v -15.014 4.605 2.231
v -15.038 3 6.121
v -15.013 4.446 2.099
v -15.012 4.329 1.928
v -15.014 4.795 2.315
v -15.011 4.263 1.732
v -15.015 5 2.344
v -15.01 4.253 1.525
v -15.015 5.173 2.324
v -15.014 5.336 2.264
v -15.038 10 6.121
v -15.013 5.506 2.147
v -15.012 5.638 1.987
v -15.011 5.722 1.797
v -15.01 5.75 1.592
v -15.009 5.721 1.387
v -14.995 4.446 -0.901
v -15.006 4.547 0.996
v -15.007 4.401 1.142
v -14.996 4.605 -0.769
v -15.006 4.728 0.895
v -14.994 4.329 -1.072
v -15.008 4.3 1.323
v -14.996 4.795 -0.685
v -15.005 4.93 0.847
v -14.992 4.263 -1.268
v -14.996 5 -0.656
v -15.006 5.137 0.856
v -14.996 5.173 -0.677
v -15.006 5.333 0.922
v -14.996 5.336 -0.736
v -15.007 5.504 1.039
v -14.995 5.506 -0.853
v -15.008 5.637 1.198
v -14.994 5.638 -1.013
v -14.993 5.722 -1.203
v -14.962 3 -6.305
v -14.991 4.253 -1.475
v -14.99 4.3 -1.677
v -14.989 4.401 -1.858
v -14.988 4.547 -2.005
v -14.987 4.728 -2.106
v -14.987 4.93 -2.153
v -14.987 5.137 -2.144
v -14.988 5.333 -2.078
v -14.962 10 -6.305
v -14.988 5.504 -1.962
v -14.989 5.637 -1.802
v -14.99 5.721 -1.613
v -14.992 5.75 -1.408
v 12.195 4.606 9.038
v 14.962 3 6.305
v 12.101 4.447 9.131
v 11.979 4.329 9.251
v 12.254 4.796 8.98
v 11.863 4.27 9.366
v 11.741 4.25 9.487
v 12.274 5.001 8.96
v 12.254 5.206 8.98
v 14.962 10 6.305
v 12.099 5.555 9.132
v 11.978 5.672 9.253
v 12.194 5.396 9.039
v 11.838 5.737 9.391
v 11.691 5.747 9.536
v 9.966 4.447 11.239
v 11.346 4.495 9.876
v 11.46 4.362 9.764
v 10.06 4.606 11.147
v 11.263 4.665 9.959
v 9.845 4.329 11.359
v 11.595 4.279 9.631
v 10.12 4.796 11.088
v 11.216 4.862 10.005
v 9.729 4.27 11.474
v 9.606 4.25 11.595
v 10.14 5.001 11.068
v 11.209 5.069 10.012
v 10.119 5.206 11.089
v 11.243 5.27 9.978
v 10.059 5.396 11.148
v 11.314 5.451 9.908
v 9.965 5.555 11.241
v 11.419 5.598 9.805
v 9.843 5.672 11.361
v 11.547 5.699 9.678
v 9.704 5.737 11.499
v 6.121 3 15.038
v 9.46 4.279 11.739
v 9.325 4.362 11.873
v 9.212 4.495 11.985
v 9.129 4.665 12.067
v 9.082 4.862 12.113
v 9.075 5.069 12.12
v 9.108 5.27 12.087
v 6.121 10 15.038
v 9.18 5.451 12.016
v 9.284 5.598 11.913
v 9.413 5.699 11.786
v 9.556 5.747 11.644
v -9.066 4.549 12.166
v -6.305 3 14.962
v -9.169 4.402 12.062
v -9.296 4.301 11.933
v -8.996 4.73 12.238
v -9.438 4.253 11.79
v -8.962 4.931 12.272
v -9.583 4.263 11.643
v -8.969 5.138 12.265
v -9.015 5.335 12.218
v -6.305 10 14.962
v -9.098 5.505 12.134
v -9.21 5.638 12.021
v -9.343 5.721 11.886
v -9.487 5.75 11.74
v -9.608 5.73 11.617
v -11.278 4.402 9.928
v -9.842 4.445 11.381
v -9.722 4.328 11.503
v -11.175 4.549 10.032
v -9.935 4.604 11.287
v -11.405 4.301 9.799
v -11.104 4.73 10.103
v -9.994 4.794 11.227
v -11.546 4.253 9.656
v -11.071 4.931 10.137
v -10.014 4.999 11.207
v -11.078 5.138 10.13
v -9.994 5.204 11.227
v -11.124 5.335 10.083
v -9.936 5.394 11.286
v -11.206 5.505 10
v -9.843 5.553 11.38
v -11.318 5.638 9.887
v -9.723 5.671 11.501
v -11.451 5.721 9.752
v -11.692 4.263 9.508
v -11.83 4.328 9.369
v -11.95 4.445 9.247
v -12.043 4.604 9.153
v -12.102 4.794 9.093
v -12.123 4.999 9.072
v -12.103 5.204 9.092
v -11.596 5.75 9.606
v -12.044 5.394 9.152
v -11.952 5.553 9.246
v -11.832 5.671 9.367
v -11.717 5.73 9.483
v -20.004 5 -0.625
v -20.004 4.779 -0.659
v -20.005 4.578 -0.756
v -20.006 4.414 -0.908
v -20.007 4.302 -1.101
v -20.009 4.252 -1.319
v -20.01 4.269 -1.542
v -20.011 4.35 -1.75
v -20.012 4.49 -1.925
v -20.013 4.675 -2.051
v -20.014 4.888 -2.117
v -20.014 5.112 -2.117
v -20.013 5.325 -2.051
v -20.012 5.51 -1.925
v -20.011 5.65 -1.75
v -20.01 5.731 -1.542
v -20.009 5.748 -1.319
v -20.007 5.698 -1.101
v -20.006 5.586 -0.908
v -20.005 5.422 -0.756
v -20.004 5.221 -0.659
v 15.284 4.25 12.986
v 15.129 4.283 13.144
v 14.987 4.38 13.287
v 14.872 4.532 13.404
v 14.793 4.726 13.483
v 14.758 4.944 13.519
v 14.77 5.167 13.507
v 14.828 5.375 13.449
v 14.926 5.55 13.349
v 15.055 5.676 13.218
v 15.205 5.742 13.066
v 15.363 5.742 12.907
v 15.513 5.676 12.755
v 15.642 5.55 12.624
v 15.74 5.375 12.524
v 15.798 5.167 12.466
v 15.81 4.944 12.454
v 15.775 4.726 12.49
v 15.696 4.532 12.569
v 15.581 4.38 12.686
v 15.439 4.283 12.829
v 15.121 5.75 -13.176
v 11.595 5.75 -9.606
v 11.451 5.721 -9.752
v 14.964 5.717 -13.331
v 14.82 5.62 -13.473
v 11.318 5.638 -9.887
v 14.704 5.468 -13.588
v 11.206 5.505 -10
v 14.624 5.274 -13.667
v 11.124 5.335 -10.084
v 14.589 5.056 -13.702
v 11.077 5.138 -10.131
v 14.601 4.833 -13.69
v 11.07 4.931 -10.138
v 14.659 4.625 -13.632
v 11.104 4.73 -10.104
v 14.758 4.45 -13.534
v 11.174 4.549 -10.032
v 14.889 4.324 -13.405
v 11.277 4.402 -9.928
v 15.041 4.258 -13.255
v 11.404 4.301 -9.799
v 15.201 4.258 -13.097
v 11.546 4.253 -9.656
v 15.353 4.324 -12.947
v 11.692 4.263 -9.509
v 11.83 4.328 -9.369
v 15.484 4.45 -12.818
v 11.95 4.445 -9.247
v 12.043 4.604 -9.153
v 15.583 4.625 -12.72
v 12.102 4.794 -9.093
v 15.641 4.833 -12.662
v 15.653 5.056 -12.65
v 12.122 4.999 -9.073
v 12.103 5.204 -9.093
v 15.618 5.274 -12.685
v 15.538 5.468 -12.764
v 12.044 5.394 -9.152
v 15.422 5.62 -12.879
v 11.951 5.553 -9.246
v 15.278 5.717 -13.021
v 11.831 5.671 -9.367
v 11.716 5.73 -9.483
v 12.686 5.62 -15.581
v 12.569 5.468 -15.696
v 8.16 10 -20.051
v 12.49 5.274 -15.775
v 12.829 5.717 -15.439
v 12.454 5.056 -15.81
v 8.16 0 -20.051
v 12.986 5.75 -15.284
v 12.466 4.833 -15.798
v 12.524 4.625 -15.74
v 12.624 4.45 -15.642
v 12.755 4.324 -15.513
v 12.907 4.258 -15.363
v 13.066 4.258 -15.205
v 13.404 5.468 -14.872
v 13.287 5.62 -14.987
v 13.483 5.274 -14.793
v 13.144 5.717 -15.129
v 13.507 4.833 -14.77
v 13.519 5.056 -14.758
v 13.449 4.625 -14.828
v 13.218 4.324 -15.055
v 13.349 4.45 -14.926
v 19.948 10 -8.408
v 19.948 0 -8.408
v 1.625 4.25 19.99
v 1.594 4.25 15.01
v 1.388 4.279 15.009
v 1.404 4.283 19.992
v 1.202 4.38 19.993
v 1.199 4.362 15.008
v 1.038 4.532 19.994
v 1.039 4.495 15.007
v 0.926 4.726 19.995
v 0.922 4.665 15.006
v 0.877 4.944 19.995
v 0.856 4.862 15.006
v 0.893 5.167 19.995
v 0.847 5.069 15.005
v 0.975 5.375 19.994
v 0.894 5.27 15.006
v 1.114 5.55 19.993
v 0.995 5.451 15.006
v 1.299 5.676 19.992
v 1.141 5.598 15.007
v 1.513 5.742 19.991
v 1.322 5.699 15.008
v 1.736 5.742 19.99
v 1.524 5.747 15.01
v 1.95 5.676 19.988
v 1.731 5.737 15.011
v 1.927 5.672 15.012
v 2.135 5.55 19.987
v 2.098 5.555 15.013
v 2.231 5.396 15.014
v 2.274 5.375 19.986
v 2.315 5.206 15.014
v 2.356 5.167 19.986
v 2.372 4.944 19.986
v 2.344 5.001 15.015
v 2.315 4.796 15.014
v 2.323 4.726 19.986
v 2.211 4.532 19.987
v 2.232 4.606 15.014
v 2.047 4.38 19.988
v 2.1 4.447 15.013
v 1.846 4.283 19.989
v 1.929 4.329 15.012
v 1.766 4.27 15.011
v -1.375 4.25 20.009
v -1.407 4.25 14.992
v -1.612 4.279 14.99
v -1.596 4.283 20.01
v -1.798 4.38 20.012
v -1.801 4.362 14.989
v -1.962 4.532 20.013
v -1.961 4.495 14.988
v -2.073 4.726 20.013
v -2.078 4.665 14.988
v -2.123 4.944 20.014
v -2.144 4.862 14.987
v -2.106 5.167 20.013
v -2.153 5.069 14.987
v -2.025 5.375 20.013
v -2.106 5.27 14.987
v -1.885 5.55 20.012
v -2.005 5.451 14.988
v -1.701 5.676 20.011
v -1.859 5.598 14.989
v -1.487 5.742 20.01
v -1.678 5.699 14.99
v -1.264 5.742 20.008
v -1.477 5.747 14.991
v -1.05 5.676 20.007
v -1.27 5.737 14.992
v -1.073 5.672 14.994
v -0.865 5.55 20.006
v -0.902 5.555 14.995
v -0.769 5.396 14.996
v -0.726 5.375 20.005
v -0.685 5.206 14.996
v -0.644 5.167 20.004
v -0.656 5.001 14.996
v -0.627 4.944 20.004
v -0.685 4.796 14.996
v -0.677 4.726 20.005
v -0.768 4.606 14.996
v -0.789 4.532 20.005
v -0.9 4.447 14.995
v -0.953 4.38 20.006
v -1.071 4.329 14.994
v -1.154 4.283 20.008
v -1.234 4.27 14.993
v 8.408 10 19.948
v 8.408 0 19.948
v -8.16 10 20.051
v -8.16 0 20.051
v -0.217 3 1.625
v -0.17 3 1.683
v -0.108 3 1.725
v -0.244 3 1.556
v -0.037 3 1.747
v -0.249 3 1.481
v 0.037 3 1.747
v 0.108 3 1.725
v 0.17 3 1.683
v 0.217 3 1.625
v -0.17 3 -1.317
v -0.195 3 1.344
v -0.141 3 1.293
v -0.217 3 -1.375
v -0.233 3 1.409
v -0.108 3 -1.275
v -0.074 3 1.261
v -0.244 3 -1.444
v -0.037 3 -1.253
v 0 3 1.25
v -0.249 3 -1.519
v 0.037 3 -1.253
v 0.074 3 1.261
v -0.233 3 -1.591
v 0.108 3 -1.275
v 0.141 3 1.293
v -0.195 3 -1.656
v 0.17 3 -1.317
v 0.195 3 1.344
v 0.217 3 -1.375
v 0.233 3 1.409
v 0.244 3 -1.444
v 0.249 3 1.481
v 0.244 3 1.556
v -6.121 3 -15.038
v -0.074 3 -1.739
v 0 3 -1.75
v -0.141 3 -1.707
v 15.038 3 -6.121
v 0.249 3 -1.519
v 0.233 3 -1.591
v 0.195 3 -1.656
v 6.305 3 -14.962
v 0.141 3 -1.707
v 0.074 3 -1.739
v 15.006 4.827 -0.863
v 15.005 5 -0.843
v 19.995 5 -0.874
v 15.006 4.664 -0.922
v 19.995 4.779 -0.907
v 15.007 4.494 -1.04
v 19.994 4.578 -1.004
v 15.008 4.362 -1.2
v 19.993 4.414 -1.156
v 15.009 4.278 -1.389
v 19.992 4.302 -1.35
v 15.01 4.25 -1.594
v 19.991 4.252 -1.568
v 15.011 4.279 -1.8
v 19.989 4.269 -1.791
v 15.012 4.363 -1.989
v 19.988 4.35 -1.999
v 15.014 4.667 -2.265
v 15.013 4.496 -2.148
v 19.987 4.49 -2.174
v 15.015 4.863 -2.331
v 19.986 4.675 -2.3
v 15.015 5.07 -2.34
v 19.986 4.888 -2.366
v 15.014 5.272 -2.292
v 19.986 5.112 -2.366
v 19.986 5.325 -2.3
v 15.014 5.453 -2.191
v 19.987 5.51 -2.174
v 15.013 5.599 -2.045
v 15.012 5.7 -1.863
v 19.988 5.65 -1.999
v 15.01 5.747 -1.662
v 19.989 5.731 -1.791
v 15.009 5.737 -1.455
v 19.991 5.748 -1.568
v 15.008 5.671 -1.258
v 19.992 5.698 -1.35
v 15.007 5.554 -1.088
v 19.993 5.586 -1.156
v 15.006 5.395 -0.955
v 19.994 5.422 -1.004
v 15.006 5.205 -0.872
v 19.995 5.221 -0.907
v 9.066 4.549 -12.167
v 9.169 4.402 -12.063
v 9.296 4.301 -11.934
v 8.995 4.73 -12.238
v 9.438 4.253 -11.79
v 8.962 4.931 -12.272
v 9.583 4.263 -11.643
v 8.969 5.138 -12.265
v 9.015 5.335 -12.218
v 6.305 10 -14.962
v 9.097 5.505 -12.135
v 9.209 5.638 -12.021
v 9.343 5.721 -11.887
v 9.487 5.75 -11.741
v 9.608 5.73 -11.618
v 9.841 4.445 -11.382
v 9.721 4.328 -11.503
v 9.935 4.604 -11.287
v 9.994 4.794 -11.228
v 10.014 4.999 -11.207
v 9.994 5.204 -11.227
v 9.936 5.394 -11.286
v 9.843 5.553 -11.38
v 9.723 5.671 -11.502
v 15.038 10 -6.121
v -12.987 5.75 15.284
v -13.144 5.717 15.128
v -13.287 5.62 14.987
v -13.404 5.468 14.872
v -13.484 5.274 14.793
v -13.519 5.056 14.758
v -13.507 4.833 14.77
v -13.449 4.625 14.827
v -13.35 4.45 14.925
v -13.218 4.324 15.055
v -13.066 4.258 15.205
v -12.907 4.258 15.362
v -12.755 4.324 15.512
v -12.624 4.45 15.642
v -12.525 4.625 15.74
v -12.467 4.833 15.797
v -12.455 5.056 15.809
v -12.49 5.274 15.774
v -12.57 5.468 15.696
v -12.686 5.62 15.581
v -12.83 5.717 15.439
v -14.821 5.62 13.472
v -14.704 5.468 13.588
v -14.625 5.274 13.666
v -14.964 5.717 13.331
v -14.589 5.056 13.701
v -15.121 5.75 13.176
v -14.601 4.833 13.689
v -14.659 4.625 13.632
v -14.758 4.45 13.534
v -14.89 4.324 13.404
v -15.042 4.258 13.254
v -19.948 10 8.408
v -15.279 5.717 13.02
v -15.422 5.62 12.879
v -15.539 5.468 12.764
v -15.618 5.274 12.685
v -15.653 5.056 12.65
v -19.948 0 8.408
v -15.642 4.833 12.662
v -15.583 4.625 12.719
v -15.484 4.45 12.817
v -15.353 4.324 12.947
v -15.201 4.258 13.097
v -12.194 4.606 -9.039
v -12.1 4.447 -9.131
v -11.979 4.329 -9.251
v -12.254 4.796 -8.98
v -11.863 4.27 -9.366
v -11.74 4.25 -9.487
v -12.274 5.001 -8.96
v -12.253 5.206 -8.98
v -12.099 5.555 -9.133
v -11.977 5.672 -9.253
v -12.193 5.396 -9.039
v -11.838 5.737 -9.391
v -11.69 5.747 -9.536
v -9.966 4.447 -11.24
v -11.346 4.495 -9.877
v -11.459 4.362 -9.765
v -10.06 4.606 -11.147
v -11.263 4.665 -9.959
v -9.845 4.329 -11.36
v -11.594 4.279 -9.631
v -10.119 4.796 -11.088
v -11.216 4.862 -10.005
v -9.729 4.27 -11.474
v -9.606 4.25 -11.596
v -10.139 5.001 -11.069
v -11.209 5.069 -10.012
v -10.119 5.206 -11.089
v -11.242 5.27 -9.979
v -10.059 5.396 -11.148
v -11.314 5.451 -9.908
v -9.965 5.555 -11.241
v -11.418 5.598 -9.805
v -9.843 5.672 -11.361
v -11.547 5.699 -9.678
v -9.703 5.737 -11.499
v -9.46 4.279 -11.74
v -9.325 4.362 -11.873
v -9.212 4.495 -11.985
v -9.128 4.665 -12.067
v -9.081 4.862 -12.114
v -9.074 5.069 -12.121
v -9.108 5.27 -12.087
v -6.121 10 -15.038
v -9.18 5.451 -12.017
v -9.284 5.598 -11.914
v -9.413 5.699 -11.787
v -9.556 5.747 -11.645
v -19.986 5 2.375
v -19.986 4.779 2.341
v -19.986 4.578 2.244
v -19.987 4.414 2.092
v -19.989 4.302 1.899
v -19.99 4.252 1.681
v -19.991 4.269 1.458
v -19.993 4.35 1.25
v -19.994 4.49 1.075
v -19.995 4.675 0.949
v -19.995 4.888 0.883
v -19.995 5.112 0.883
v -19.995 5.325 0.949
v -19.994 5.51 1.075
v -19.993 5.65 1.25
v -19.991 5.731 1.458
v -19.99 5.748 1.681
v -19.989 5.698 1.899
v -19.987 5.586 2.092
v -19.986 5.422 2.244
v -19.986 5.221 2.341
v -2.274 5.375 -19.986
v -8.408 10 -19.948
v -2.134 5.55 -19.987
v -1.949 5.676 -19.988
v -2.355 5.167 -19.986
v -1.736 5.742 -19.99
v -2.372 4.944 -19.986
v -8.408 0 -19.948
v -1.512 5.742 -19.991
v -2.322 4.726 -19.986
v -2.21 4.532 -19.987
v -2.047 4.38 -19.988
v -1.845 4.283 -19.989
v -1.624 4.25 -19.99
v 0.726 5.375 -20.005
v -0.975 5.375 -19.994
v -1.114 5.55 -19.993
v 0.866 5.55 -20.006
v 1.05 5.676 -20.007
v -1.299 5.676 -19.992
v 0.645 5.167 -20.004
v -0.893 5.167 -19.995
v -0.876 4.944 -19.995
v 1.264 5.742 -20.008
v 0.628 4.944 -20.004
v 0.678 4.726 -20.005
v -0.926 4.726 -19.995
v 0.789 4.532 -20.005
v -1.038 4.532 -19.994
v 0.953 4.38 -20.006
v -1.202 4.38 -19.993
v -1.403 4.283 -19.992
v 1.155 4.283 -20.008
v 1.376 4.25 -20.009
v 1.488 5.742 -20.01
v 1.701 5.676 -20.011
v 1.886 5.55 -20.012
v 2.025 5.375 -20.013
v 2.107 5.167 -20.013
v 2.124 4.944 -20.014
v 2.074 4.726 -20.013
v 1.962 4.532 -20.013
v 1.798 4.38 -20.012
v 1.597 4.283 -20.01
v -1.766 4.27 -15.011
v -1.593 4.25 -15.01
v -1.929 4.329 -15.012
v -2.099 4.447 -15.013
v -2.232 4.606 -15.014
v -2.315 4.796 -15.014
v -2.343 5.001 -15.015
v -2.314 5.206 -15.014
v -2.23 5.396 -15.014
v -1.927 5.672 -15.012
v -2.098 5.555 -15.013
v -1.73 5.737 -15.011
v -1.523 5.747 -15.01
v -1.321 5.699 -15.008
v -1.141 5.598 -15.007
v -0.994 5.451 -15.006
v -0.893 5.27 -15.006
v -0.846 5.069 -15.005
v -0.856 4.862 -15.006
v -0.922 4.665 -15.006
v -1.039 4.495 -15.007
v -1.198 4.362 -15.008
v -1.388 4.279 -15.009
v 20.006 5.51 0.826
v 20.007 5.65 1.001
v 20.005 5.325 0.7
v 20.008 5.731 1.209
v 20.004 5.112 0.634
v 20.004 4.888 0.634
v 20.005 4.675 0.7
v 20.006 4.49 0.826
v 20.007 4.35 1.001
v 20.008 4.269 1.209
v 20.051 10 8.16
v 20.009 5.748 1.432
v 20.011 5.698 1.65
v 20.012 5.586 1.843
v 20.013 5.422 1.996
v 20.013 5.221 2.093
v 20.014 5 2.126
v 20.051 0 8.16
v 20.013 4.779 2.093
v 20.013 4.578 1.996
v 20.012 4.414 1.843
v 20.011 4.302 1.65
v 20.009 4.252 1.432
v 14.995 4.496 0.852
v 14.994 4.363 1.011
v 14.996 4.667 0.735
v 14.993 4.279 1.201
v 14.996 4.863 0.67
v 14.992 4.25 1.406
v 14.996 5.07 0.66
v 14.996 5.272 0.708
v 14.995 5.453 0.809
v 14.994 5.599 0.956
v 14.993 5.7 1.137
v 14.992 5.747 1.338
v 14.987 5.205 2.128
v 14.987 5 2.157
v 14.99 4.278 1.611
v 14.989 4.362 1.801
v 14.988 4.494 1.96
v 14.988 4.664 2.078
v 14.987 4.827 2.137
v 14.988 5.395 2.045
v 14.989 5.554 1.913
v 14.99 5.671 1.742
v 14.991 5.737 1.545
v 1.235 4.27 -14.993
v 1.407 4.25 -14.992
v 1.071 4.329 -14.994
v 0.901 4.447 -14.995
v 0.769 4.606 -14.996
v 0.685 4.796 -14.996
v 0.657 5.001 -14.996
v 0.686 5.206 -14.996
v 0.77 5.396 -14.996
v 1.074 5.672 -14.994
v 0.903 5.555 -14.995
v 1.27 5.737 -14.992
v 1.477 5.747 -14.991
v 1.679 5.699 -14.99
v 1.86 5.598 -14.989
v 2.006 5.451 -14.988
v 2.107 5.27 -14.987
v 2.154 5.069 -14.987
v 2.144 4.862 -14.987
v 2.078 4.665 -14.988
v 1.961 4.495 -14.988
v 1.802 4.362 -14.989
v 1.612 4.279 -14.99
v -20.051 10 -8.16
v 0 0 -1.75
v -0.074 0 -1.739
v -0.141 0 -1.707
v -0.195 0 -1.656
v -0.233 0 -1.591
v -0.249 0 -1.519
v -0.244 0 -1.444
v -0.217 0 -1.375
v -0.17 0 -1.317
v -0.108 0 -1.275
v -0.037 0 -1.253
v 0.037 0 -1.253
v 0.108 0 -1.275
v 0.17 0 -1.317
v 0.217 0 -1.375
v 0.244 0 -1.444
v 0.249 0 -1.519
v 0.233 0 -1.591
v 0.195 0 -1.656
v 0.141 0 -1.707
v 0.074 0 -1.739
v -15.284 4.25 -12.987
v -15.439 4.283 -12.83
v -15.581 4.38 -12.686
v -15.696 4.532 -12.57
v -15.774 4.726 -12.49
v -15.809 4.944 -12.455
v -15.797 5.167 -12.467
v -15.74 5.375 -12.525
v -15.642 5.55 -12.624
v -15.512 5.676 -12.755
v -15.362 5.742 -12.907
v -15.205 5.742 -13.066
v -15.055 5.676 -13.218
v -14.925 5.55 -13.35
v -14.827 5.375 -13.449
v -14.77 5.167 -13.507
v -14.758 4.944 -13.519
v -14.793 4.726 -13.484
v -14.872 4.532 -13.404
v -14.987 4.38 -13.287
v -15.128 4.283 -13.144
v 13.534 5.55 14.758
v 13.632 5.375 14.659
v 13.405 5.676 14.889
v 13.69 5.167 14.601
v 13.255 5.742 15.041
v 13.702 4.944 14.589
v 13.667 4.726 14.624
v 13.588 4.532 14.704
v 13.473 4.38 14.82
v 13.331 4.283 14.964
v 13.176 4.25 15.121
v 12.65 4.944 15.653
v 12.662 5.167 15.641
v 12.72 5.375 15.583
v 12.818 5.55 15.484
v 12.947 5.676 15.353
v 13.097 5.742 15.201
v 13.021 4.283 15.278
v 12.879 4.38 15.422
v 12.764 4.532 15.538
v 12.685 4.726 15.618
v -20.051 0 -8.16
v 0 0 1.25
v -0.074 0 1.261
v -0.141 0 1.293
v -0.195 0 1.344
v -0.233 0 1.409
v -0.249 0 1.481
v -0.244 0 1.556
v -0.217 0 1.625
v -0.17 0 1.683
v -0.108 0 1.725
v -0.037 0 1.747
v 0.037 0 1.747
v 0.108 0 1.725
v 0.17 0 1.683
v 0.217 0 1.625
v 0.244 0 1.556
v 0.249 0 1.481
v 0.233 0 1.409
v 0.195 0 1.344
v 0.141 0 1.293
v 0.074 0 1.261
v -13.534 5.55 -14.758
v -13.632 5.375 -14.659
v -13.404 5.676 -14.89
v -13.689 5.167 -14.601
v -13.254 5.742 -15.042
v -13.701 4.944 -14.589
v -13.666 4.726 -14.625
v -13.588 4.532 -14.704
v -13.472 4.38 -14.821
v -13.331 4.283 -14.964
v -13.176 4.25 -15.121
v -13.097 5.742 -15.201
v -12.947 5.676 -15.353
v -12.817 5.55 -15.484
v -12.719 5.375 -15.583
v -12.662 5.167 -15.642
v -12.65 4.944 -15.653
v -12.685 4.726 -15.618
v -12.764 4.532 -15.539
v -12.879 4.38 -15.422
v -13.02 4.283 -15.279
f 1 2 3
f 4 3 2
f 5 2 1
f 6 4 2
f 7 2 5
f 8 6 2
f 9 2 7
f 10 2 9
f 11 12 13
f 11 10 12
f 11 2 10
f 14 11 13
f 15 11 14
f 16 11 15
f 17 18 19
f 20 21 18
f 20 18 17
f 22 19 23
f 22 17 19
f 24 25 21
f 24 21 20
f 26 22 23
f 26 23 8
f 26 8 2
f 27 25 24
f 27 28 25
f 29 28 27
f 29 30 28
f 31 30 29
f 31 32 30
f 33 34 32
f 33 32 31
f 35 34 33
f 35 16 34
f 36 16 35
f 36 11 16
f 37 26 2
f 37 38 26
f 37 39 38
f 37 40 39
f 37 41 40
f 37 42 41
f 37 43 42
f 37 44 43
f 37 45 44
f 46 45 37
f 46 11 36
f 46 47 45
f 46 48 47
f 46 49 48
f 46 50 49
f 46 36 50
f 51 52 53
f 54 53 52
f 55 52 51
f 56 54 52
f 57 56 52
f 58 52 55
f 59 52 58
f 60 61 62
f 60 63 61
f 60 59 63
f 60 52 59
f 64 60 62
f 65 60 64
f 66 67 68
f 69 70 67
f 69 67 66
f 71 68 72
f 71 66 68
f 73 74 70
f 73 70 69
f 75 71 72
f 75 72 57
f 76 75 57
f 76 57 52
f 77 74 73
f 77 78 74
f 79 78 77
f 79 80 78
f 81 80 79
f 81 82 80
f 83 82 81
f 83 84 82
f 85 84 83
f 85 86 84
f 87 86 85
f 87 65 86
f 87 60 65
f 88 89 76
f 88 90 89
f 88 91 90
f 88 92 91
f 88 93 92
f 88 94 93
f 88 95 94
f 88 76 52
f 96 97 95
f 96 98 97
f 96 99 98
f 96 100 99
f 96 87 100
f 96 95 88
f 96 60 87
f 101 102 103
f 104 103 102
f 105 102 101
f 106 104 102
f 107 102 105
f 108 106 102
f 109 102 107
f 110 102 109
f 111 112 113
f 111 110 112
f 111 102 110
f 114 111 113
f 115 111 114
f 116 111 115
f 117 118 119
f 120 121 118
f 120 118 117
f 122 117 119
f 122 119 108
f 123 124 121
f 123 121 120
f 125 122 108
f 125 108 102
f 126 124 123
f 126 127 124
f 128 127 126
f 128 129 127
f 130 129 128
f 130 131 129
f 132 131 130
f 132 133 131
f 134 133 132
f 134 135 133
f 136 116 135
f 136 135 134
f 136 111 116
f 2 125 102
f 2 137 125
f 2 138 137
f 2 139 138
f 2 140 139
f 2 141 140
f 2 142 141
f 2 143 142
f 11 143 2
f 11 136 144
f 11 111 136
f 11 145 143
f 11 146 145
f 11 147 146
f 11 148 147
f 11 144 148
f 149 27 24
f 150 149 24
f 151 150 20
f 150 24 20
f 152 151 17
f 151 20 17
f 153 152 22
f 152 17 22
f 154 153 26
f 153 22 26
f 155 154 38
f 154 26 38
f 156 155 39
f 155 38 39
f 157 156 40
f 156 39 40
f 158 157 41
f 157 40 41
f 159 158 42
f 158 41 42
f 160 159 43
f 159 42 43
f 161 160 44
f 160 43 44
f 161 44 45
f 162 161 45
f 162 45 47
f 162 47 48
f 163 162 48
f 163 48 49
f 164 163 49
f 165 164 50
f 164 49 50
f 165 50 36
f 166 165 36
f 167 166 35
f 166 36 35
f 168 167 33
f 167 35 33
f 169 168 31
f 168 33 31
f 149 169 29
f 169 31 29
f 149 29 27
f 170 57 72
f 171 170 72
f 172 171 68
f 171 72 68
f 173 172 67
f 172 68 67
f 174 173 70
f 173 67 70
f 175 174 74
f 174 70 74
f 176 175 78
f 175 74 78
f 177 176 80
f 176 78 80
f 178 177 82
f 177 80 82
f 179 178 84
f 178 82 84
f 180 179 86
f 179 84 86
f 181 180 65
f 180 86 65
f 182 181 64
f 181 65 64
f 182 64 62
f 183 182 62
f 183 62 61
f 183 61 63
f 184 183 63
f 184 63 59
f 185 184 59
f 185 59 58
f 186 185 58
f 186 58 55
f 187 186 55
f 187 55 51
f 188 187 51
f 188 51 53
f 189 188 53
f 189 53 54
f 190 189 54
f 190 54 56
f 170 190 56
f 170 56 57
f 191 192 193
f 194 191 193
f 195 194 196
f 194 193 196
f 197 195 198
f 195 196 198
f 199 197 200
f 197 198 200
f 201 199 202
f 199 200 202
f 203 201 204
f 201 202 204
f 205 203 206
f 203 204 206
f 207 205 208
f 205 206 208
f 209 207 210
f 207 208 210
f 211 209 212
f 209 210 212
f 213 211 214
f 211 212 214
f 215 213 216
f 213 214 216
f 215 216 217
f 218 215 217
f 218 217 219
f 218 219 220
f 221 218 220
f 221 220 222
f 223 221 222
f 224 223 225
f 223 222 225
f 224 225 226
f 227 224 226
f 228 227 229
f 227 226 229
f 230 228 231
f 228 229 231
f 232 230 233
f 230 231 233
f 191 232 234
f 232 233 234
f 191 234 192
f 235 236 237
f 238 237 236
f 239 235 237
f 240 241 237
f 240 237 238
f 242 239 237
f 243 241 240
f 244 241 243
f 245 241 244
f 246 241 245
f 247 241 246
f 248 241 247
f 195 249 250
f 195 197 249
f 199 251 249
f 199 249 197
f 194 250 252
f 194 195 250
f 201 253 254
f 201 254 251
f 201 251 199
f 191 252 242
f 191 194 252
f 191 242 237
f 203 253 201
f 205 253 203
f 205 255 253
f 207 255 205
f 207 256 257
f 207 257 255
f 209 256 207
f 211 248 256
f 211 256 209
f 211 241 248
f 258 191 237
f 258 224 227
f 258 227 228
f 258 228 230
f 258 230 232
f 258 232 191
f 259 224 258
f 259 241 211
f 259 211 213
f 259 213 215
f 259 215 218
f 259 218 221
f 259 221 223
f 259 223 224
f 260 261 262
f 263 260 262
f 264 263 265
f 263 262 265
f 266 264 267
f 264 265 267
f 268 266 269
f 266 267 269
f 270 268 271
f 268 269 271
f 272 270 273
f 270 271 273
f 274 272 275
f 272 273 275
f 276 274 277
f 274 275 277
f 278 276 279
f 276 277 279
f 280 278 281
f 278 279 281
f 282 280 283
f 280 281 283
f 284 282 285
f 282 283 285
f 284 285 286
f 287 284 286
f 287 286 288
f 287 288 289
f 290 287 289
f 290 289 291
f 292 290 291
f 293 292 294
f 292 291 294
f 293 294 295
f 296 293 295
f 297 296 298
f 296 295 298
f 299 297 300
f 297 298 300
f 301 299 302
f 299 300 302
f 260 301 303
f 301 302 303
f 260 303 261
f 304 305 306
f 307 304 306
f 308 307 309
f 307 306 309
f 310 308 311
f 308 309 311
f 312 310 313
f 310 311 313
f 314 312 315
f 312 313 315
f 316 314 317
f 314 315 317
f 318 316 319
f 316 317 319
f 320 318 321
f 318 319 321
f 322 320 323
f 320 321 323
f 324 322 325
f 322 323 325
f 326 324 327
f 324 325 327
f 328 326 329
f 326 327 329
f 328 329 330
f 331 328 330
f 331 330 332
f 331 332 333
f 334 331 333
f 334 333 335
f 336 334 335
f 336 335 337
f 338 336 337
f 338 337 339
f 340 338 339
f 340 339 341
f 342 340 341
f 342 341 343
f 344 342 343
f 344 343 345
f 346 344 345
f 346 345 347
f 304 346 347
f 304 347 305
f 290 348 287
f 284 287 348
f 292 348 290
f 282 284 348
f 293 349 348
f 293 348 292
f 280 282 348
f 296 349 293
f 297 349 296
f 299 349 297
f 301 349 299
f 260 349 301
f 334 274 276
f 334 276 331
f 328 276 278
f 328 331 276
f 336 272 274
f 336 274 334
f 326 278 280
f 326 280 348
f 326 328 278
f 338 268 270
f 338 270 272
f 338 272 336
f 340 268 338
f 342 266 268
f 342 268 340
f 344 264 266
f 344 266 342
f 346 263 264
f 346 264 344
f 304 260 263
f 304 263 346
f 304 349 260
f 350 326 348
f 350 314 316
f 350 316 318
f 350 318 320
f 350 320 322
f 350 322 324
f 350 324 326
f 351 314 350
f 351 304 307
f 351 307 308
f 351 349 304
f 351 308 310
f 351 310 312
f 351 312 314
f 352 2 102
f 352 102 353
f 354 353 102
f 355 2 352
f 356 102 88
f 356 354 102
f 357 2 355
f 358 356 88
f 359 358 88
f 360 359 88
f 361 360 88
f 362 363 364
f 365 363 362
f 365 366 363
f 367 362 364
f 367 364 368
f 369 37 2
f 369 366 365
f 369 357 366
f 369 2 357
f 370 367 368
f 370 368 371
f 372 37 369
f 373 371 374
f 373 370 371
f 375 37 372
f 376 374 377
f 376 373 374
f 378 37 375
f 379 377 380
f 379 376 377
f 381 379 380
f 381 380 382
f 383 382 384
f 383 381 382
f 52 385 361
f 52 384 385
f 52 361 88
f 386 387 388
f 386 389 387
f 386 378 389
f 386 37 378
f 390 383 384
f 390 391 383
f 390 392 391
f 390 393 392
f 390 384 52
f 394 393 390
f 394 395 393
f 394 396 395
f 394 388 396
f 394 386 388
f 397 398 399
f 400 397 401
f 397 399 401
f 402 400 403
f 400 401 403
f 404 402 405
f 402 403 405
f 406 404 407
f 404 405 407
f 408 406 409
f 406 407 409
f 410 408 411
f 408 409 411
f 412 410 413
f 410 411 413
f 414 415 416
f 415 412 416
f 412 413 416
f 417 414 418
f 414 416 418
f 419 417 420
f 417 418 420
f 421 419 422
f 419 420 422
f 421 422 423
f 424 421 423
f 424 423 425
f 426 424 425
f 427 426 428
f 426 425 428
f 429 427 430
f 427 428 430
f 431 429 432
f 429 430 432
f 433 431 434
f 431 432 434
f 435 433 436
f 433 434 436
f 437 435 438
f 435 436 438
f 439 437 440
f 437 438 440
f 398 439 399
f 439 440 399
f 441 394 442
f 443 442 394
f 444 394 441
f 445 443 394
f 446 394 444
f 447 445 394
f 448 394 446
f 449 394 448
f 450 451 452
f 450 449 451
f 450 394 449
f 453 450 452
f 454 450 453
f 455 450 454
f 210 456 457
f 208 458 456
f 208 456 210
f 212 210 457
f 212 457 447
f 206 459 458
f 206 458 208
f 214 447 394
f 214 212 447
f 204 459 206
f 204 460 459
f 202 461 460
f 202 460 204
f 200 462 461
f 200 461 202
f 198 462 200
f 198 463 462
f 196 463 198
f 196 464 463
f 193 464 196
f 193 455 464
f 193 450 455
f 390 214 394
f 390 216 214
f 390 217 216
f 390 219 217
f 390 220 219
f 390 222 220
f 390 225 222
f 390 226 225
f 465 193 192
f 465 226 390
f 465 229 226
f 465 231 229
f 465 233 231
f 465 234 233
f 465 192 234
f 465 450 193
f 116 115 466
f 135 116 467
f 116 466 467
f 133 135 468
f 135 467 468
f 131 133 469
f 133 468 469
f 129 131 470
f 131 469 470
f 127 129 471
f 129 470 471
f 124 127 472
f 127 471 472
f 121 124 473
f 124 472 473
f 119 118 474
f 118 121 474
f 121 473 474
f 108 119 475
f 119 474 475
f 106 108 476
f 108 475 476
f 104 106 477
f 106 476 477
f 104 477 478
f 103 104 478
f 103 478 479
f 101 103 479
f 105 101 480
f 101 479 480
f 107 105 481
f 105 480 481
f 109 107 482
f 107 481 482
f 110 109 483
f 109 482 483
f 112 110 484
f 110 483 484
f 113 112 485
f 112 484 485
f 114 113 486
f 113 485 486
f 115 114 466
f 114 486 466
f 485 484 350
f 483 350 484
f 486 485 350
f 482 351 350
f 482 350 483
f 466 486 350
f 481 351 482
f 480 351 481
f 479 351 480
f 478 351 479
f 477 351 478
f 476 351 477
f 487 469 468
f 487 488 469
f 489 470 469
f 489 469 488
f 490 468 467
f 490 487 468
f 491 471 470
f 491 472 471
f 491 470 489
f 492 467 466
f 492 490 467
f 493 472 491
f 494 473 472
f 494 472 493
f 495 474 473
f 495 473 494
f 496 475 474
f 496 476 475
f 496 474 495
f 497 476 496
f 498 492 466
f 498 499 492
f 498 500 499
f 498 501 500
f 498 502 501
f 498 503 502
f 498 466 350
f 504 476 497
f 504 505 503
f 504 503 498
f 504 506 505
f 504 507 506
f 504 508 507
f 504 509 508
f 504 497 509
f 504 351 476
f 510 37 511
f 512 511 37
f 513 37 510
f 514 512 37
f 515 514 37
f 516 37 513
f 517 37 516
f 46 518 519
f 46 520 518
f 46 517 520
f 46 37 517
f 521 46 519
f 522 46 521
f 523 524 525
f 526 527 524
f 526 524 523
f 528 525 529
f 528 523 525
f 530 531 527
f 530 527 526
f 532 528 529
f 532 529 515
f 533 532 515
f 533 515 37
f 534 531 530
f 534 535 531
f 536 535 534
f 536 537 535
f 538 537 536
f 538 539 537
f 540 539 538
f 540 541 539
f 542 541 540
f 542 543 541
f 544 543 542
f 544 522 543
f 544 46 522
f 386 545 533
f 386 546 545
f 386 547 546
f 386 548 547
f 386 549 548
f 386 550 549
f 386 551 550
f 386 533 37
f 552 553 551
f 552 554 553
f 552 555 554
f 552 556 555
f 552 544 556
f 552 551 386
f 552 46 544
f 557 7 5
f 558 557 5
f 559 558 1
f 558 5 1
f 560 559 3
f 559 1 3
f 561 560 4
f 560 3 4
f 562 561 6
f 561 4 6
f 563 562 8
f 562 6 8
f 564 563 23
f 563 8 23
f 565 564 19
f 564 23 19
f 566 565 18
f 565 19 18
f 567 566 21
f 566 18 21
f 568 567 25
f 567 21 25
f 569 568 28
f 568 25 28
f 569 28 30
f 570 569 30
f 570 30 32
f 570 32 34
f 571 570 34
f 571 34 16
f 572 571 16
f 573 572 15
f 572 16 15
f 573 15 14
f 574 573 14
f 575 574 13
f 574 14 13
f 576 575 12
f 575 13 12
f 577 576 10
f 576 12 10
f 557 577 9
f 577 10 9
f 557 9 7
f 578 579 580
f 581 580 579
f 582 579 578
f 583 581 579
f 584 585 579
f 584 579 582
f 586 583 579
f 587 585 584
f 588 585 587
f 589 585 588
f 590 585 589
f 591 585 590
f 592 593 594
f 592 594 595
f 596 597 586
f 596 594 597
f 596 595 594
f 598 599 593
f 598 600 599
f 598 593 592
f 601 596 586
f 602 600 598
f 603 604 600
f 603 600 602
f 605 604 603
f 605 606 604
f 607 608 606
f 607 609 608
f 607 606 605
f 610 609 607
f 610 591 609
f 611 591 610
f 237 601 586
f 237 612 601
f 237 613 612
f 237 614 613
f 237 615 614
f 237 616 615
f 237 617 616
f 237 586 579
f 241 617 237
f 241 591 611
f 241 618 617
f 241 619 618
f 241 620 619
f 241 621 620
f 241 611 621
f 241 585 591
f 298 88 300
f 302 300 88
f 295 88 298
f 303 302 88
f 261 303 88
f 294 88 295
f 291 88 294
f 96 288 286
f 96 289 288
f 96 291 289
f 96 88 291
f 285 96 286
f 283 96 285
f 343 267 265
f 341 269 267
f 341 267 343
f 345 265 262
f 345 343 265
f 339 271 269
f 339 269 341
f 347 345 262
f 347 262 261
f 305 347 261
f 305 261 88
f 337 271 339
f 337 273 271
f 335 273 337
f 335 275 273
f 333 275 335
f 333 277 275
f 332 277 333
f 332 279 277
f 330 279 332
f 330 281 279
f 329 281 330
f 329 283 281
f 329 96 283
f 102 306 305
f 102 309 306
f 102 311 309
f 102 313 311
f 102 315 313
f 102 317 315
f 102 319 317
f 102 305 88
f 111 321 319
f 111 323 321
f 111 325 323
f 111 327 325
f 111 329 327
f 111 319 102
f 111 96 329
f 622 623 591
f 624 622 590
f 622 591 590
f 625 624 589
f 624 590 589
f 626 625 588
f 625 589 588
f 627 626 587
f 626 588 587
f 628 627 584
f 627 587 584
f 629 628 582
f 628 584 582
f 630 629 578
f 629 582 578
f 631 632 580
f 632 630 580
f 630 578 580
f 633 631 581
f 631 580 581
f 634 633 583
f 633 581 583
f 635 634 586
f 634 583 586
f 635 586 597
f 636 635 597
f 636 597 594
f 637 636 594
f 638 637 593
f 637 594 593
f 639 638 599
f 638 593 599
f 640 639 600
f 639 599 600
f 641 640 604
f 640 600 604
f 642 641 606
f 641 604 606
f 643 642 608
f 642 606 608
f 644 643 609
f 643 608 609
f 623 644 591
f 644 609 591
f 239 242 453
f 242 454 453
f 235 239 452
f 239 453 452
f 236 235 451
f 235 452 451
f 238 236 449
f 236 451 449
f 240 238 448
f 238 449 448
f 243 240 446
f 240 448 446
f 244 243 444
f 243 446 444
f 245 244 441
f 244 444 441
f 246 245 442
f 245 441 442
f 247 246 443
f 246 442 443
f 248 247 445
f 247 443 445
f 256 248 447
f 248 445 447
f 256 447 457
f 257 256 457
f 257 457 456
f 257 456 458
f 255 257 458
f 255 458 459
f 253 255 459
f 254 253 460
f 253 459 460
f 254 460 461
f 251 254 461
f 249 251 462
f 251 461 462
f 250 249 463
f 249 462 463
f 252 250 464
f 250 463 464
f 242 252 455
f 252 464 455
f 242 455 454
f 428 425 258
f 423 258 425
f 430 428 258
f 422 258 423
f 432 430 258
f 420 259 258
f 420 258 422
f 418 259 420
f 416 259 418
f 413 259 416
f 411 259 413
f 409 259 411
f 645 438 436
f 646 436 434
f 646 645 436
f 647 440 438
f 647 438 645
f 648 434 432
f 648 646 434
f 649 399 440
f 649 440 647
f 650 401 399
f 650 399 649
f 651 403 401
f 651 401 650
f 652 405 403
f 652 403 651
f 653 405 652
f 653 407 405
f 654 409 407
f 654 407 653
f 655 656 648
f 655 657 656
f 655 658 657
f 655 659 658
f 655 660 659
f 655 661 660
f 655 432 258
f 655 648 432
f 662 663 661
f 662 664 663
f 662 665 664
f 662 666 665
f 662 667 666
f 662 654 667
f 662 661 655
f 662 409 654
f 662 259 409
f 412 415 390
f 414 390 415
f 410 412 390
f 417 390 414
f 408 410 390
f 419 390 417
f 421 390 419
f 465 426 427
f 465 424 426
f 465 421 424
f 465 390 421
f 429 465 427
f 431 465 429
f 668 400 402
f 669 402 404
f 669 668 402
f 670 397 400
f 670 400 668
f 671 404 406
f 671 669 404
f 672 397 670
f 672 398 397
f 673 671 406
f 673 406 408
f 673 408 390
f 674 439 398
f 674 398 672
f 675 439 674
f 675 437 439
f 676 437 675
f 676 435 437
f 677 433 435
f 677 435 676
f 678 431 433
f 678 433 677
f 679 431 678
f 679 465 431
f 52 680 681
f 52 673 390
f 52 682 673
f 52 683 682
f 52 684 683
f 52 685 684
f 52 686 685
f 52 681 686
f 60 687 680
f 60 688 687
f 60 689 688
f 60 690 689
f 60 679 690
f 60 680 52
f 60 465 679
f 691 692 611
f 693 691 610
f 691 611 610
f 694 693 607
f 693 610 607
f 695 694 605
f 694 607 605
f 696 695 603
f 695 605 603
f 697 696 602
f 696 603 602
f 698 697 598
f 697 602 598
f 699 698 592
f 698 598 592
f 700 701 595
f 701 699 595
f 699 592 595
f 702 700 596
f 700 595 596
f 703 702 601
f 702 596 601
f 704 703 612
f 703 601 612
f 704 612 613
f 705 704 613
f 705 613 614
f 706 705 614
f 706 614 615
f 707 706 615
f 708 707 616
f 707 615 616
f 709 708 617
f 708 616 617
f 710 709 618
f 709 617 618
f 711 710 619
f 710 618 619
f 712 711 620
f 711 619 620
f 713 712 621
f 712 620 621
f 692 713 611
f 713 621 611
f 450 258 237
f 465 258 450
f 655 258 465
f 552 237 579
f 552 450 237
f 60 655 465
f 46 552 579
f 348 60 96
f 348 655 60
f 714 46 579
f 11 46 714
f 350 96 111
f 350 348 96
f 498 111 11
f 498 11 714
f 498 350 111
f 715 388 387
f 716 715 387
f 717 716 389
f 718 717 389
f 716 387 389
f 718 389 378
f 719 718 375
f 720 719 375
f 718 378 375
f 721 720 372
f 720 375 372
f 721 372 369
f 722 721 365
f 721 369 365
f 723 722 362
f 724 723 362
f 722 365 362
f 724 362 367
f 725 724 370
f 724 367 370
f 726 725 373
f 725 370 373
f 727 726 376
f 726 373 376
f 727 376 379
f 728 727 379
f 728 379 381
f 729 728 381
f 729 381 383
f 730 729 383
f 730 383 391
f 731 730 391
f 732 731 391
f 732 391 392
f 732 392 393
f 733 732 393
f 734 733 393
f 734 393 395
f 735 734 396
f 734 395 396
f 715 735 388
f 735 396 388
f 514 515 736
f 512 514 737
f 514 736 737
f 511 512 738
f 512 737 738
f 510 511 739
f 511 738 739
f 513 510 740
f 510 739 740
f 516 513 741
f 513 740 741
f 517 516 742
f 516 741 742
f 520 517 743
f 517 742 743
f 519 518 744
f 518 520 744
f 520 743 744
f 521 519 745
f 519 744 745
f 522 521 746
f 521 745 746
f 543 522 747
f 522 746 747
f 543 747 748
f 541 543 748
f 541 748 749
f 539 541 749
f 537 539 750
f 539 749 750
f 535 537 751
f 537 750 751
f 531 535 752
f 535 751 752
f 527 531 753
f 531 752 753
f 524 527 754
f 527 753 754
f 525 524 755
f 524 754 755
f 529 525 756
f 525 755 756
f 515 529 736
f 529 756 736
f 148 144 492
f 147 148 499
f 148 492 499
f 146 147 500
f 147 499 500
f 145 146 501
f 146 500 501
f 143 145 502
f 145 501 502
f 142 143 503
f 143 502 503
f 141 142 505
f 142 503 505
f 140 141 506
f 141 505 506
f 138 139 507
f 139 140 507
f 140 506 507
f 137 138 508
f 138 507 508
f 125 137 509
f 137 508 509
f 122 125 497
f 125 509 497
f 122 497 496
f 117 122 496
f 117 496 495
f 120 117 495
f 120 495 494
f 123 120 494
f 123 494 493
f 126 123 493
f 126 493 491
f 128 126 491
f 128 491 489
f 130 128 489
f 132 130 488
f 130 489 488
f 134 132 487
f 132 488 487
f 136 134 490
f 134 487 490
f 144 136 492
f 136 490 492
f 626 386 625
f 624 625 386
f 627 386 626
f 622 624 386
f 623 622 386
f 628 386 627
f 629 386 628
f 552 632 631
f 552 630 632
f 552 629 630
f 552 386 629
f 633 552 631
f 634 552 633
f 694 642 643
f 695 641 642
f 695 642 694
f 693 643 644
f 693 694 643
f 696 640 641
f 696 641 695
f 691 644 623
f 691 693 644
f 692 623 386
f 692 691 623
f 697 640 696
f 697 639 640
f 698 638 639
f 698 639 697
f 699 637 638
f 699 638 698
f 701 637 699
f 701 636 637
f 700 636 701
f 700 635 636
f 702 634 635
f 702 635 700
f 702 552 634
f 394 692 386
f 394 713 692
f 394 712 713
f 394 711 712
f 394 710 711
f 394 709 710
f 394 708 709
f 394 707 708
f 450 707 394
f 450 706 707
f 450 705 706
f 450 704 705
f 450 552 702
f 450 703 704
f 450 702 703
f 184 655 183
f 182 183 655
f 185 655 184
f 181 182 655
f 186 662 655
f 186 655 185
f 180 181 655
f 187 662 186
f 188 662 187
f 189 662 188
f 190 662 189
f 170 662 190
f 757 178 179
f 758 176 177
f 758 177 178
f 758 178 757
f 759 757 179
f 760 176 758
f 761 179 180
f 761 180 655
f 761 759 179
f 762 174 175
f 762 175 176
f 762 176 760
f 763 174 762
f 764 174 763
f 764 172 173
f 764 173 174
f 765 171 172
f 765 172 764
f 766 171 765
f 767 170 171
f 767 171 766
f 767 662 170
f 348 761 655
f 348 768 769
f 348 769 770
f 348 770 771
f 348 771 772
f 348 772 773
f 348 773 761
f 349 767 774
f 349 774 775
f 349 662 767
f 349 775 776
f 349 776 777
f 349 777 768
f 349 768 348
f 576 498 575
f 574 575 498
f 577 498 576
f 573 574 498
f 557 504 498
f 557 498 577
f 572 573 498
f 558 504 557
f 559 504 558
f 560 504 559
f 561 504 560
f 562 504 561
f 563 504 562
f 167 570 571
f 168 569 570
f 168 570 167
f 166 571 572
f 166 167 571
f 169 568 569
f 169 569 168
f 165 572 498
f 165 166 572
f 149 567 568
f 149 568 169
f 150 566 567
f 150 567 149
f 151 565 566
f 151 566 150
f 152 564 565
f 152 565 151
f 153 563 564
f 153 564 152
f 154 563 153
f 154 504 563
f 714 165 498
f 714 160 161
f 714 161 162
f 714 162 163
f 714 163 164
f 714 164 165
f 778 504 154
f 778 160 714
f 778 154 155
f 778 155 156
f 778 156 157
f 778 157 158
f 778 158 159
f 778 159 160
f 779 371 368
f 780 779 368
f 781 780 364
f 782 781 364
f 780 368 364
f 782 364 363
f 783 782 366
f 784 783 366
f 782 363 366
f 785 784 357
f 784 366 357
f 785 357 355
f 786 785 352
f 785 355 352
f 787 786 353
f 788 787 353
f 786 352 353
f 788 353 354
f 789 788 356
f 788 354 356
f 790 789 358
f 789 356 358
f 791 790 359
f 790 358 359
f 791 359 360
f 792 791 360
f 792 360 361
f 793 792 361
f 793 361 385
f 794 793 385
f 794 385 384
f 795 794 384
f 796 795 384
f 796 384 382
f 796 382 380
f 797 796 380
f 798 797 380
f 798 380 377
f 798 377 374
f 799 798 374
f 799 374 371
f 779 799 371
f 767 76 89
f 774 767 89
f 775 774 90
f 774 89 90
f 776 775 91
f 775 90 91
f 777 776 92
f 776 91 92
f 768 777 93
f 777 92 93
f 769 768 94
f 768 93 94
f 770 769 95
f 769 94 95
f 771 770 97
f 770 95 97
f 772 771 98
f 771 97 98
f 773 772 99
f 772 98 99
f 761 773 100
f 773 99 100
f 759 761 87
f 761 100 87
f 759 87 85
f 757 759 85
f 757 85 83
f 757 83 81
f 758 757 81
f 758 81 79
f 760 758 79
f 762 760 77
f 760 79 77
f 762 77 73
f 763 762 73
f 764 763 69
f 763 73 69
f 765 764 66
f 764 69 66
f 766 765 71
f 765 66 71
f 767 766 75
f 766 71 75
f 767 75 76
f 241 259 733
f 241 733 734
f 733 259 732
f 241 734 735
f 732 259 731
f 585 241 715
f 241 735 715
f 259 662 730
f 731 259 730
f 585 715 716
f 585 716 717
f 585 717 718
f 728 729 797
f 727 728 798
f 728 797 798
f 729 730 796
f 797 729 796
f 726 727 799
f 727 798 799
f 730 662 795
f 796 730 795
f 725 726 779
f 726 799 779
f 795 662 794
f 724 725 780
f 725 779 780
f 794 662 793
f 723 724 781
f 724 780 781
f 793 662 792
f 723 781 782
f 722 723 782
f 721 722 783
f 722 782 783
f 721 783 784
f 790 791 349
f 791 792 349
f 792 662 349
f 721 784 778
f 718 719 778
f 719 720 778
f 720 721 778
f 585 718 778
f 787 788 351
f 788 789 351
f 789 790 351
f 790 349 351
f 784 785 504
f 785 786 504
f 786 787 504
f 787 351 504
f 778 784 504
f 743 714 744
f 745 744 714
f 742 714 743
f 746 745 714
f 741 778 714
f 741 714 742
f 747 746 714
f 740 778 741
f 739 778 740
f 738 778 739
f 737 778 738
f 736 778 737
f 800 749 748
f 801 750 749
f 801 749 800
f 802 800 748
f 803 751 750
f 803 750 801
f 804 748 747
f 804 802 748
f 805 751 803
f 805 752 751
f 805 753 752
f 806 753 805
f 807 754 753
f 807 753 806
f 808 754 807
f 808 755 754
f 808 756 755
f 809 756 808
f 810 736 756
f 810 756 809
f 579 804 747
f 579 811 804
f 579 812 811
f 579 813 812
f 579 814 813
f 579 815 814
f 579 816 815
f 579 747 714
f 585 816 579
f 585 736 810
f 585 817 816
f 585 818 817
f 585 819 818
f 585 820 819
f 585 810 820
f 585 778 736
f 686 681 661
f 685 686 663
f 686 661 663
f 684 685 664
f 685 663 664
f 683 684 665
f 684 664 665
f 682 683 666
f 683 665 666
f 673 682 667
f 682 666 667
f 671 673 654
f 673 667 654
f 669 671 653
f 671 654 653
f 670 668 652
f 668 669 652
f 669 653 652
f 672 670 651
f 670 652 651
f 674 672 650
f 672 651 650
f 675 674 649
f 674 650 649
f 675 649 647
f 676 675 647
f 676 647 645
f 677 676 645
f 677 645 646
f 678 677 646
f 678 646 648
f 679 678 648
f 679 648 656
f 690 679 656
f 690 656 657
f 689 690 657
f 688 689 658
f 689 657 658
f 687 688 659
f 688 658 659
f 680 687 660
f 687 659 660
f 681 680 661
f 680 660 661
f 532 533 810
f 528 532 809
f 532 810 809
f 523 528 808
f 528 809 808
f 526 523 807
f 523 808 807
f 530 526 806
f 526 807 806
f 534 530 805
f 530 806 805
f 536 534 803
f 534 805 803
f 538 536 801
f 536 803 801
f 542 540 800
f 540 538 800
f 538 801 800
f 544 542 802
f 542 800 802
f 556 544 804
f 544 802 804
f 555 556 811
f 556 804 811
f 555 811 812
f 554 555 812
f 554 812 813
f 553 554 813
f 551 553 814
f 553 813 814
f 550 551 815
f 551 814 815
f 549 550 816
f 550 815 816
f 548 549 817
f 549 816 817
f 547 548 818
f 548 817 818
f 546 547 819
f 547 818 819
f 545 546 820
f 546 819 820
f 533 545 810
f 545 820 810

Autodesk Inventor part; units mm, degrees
ref_plane "YZ Plane" through (0, 0, 0) normal (1, 0, 0) x (0, 1, 0)
ref_plane "XZ Plane" through (0, 0, 0) normal (0, 1, 0) x (-1, 0, 0)
ref_plane "XY Plane" through (0, 0, 0) normal (0, 0, 1) x (1, 0, 0)
sketch "Sketch2" plane through (0, 0, 0) normal (0, 1, 0) x (-1, 0, 0)
  line L0 (8.4085, -19.9481) -> (-8.1597, -20.0511)
  line L1 (-8.1597, -20.0511) -> (-19.9481, -8.4085)
  line L2 (-19.9481, -8.4085) -> (-20.0511, 8.1597)
  line L3 (-20.0511, 8.1597) -> (-8.4085, 19.9481)
  line L4 (-8.4085, 19.9481) -> (8.1597, 20.0511)
  line L5 (8.1597, 20.0511) -> (19.9481, 8.4085)
  line L6 (19.9481, 8.4085) -> (20.0511, -8.1597)
  line L7 (20.0511, -8.1597) -> (8.4085, -19.9481)
  point P0 (0, 0)
  point P1 (0, 0)
  dimension "d12" = 20
  dimension "d13" = 16.5682
extrude "Extrusion1" add sketch "Sketch2" along normal blind 10
sketch "Sketch3" plane through (0, 10, 0) normal (0, 1, 0) x (1, 0, 0)
  line L0 (-6.1212, 15.0378) -> (6.305, 14.9616)
  line L1 (6.305, 14.9616) -> (15.0378, 6.1212)
  line L2 (15.0378, 6.1212) -> (14.9616, -6.305)
  line L3 (14.9616, -6.305) -> (6.1212, -15.0378)
  line L4 (6.1212, -15.0378) -> (-6.305, -14.9616)
  line L5 (-6.305, -14.9616) -> (-15.0378, -6.1212)
  line L6 (-15.0378, -6.1212) -> (-14.9616, 6.305)
  line L7 (-14.9616, 6.305) -> (-6.1212, 15.0378)
  point P0 (0, 0)
  point P1 (0, 0)
  dimension "d16" = 15
  dimension "d17" = 12.4262
extrude "Extrusion2" cut sketch "Sketch3" against normal blind 7
sketch "Sketch4" plane through (0, 0, 0) normal (0, -1, 0) x (1, 0, 0)
  point P0 (0, 0)
  point P1 (0, 1.5)
  point P2 (0, -1.5)
hole "Hole1" at (0, 0, 1.5) at (0, 0, -1.5) direction (0, 1, 0) diameter 0.5 end through all
sketch "Sketch5" plane through (8.4085, 0, 19.9481) normal (0.0062188, 0, 0.9999807) x (0.9999807, 0, -0.0062188)
  line L0 (-8.2843, 0) -> (-8.2843, 10)
  line L1 (-2.2567, 10) -> (-14.6822, 10) projected
  line L2 (0, 0) -> (0, 10) projected
  line L3 (0, 5) -> (-16.5685, 5)
  line L4 (-16.5685, 0) -> (-16.5685, 10) projected
  point P0 (-9.784, 5)
  point P1 (-6.784, 5)
hole "Hole2" at (-1.3753, 5, 20.0089) at (1.6246, 5, 19.9903) direction (-0.0062188, 0, -0.9999807) diameter 1.5 end through all
sketch "Sketch6" plane through (-19.9481, 0, 8.4085) normal (-0.9999807, 0, 0.0062188) x (0.0062188, 0, 0.9999807)
  line L0 (-8.2843, 0) -> (-8.2843, 10)
  line L1 (-2.2567, 10) -> (-14.6822, 10) projected
  line L2 (-16.5685, 0) -> (-16.5685, 10) projected
  line L3 (-16.5685, 5) -> (0, 5)
  line L4 (0, 0) -> (0, 10) projected
  point P0 (-6.784, 5)
  point P1 (-9.784, 5)
hole "Hole3" at (-19.9903, 5, 1.6246) at (-20.0089, 5, -1.3753) direction (0.9999807, 0, -0.0062188) diameter 1.5 end through all
sketch "Sketch7" plane through (20.0511, 0, 8.1597) normal (0.7114905, 0, 0.7026957) x (0.7026957, 0, -0.7114905)
  line L0 (-8.2843, 0) -> (-8.2843, 10)
  line L1 (-2.2567, 10) -> (-14.6822, 10) projected
  line L2 (-16.5685, 0) -> (-16.5685, 10) projected
  line L3 (-16.5685, 5) -> (0, 5)
  line L4 (0, 0) -> (0, 10) projected
  point P0 (-9.784, 5)
  point P1 (-6.784, 5)
hole "Hole4" at (13.176, 5, 15.121) at (15.284, 5, 12.9865) direction (-0.7114905, 0, -0.7026957) diameter 1.5 end through all
sketch "Sketch8" plane through (8.1597, 0, -20.0511) normal (0.7026957, 0, -0.7114905) x (-0.7114905, 0, -0.7026957)
  line L0 (-8.2843, 0) -> (-8.2843, 10)
  line L1 (-16.5685, 10) -> (0, 10) projected
  line L2 (-16.5685, 0) -> (-16.5685, 10) projected
  line L3 (-16.5685, 5) -> (0.0284, 5)
  point P0 (-9.784, 5)
  point P1 (-6.784, 5)
hole "Hole5" at (15.121, 5, -13.176) at (12.9865, 5, -15.284) direction (-0.7026957, 0, 0.7114905) diameter 1.5 end through all
properties part number "oktagonOben"
